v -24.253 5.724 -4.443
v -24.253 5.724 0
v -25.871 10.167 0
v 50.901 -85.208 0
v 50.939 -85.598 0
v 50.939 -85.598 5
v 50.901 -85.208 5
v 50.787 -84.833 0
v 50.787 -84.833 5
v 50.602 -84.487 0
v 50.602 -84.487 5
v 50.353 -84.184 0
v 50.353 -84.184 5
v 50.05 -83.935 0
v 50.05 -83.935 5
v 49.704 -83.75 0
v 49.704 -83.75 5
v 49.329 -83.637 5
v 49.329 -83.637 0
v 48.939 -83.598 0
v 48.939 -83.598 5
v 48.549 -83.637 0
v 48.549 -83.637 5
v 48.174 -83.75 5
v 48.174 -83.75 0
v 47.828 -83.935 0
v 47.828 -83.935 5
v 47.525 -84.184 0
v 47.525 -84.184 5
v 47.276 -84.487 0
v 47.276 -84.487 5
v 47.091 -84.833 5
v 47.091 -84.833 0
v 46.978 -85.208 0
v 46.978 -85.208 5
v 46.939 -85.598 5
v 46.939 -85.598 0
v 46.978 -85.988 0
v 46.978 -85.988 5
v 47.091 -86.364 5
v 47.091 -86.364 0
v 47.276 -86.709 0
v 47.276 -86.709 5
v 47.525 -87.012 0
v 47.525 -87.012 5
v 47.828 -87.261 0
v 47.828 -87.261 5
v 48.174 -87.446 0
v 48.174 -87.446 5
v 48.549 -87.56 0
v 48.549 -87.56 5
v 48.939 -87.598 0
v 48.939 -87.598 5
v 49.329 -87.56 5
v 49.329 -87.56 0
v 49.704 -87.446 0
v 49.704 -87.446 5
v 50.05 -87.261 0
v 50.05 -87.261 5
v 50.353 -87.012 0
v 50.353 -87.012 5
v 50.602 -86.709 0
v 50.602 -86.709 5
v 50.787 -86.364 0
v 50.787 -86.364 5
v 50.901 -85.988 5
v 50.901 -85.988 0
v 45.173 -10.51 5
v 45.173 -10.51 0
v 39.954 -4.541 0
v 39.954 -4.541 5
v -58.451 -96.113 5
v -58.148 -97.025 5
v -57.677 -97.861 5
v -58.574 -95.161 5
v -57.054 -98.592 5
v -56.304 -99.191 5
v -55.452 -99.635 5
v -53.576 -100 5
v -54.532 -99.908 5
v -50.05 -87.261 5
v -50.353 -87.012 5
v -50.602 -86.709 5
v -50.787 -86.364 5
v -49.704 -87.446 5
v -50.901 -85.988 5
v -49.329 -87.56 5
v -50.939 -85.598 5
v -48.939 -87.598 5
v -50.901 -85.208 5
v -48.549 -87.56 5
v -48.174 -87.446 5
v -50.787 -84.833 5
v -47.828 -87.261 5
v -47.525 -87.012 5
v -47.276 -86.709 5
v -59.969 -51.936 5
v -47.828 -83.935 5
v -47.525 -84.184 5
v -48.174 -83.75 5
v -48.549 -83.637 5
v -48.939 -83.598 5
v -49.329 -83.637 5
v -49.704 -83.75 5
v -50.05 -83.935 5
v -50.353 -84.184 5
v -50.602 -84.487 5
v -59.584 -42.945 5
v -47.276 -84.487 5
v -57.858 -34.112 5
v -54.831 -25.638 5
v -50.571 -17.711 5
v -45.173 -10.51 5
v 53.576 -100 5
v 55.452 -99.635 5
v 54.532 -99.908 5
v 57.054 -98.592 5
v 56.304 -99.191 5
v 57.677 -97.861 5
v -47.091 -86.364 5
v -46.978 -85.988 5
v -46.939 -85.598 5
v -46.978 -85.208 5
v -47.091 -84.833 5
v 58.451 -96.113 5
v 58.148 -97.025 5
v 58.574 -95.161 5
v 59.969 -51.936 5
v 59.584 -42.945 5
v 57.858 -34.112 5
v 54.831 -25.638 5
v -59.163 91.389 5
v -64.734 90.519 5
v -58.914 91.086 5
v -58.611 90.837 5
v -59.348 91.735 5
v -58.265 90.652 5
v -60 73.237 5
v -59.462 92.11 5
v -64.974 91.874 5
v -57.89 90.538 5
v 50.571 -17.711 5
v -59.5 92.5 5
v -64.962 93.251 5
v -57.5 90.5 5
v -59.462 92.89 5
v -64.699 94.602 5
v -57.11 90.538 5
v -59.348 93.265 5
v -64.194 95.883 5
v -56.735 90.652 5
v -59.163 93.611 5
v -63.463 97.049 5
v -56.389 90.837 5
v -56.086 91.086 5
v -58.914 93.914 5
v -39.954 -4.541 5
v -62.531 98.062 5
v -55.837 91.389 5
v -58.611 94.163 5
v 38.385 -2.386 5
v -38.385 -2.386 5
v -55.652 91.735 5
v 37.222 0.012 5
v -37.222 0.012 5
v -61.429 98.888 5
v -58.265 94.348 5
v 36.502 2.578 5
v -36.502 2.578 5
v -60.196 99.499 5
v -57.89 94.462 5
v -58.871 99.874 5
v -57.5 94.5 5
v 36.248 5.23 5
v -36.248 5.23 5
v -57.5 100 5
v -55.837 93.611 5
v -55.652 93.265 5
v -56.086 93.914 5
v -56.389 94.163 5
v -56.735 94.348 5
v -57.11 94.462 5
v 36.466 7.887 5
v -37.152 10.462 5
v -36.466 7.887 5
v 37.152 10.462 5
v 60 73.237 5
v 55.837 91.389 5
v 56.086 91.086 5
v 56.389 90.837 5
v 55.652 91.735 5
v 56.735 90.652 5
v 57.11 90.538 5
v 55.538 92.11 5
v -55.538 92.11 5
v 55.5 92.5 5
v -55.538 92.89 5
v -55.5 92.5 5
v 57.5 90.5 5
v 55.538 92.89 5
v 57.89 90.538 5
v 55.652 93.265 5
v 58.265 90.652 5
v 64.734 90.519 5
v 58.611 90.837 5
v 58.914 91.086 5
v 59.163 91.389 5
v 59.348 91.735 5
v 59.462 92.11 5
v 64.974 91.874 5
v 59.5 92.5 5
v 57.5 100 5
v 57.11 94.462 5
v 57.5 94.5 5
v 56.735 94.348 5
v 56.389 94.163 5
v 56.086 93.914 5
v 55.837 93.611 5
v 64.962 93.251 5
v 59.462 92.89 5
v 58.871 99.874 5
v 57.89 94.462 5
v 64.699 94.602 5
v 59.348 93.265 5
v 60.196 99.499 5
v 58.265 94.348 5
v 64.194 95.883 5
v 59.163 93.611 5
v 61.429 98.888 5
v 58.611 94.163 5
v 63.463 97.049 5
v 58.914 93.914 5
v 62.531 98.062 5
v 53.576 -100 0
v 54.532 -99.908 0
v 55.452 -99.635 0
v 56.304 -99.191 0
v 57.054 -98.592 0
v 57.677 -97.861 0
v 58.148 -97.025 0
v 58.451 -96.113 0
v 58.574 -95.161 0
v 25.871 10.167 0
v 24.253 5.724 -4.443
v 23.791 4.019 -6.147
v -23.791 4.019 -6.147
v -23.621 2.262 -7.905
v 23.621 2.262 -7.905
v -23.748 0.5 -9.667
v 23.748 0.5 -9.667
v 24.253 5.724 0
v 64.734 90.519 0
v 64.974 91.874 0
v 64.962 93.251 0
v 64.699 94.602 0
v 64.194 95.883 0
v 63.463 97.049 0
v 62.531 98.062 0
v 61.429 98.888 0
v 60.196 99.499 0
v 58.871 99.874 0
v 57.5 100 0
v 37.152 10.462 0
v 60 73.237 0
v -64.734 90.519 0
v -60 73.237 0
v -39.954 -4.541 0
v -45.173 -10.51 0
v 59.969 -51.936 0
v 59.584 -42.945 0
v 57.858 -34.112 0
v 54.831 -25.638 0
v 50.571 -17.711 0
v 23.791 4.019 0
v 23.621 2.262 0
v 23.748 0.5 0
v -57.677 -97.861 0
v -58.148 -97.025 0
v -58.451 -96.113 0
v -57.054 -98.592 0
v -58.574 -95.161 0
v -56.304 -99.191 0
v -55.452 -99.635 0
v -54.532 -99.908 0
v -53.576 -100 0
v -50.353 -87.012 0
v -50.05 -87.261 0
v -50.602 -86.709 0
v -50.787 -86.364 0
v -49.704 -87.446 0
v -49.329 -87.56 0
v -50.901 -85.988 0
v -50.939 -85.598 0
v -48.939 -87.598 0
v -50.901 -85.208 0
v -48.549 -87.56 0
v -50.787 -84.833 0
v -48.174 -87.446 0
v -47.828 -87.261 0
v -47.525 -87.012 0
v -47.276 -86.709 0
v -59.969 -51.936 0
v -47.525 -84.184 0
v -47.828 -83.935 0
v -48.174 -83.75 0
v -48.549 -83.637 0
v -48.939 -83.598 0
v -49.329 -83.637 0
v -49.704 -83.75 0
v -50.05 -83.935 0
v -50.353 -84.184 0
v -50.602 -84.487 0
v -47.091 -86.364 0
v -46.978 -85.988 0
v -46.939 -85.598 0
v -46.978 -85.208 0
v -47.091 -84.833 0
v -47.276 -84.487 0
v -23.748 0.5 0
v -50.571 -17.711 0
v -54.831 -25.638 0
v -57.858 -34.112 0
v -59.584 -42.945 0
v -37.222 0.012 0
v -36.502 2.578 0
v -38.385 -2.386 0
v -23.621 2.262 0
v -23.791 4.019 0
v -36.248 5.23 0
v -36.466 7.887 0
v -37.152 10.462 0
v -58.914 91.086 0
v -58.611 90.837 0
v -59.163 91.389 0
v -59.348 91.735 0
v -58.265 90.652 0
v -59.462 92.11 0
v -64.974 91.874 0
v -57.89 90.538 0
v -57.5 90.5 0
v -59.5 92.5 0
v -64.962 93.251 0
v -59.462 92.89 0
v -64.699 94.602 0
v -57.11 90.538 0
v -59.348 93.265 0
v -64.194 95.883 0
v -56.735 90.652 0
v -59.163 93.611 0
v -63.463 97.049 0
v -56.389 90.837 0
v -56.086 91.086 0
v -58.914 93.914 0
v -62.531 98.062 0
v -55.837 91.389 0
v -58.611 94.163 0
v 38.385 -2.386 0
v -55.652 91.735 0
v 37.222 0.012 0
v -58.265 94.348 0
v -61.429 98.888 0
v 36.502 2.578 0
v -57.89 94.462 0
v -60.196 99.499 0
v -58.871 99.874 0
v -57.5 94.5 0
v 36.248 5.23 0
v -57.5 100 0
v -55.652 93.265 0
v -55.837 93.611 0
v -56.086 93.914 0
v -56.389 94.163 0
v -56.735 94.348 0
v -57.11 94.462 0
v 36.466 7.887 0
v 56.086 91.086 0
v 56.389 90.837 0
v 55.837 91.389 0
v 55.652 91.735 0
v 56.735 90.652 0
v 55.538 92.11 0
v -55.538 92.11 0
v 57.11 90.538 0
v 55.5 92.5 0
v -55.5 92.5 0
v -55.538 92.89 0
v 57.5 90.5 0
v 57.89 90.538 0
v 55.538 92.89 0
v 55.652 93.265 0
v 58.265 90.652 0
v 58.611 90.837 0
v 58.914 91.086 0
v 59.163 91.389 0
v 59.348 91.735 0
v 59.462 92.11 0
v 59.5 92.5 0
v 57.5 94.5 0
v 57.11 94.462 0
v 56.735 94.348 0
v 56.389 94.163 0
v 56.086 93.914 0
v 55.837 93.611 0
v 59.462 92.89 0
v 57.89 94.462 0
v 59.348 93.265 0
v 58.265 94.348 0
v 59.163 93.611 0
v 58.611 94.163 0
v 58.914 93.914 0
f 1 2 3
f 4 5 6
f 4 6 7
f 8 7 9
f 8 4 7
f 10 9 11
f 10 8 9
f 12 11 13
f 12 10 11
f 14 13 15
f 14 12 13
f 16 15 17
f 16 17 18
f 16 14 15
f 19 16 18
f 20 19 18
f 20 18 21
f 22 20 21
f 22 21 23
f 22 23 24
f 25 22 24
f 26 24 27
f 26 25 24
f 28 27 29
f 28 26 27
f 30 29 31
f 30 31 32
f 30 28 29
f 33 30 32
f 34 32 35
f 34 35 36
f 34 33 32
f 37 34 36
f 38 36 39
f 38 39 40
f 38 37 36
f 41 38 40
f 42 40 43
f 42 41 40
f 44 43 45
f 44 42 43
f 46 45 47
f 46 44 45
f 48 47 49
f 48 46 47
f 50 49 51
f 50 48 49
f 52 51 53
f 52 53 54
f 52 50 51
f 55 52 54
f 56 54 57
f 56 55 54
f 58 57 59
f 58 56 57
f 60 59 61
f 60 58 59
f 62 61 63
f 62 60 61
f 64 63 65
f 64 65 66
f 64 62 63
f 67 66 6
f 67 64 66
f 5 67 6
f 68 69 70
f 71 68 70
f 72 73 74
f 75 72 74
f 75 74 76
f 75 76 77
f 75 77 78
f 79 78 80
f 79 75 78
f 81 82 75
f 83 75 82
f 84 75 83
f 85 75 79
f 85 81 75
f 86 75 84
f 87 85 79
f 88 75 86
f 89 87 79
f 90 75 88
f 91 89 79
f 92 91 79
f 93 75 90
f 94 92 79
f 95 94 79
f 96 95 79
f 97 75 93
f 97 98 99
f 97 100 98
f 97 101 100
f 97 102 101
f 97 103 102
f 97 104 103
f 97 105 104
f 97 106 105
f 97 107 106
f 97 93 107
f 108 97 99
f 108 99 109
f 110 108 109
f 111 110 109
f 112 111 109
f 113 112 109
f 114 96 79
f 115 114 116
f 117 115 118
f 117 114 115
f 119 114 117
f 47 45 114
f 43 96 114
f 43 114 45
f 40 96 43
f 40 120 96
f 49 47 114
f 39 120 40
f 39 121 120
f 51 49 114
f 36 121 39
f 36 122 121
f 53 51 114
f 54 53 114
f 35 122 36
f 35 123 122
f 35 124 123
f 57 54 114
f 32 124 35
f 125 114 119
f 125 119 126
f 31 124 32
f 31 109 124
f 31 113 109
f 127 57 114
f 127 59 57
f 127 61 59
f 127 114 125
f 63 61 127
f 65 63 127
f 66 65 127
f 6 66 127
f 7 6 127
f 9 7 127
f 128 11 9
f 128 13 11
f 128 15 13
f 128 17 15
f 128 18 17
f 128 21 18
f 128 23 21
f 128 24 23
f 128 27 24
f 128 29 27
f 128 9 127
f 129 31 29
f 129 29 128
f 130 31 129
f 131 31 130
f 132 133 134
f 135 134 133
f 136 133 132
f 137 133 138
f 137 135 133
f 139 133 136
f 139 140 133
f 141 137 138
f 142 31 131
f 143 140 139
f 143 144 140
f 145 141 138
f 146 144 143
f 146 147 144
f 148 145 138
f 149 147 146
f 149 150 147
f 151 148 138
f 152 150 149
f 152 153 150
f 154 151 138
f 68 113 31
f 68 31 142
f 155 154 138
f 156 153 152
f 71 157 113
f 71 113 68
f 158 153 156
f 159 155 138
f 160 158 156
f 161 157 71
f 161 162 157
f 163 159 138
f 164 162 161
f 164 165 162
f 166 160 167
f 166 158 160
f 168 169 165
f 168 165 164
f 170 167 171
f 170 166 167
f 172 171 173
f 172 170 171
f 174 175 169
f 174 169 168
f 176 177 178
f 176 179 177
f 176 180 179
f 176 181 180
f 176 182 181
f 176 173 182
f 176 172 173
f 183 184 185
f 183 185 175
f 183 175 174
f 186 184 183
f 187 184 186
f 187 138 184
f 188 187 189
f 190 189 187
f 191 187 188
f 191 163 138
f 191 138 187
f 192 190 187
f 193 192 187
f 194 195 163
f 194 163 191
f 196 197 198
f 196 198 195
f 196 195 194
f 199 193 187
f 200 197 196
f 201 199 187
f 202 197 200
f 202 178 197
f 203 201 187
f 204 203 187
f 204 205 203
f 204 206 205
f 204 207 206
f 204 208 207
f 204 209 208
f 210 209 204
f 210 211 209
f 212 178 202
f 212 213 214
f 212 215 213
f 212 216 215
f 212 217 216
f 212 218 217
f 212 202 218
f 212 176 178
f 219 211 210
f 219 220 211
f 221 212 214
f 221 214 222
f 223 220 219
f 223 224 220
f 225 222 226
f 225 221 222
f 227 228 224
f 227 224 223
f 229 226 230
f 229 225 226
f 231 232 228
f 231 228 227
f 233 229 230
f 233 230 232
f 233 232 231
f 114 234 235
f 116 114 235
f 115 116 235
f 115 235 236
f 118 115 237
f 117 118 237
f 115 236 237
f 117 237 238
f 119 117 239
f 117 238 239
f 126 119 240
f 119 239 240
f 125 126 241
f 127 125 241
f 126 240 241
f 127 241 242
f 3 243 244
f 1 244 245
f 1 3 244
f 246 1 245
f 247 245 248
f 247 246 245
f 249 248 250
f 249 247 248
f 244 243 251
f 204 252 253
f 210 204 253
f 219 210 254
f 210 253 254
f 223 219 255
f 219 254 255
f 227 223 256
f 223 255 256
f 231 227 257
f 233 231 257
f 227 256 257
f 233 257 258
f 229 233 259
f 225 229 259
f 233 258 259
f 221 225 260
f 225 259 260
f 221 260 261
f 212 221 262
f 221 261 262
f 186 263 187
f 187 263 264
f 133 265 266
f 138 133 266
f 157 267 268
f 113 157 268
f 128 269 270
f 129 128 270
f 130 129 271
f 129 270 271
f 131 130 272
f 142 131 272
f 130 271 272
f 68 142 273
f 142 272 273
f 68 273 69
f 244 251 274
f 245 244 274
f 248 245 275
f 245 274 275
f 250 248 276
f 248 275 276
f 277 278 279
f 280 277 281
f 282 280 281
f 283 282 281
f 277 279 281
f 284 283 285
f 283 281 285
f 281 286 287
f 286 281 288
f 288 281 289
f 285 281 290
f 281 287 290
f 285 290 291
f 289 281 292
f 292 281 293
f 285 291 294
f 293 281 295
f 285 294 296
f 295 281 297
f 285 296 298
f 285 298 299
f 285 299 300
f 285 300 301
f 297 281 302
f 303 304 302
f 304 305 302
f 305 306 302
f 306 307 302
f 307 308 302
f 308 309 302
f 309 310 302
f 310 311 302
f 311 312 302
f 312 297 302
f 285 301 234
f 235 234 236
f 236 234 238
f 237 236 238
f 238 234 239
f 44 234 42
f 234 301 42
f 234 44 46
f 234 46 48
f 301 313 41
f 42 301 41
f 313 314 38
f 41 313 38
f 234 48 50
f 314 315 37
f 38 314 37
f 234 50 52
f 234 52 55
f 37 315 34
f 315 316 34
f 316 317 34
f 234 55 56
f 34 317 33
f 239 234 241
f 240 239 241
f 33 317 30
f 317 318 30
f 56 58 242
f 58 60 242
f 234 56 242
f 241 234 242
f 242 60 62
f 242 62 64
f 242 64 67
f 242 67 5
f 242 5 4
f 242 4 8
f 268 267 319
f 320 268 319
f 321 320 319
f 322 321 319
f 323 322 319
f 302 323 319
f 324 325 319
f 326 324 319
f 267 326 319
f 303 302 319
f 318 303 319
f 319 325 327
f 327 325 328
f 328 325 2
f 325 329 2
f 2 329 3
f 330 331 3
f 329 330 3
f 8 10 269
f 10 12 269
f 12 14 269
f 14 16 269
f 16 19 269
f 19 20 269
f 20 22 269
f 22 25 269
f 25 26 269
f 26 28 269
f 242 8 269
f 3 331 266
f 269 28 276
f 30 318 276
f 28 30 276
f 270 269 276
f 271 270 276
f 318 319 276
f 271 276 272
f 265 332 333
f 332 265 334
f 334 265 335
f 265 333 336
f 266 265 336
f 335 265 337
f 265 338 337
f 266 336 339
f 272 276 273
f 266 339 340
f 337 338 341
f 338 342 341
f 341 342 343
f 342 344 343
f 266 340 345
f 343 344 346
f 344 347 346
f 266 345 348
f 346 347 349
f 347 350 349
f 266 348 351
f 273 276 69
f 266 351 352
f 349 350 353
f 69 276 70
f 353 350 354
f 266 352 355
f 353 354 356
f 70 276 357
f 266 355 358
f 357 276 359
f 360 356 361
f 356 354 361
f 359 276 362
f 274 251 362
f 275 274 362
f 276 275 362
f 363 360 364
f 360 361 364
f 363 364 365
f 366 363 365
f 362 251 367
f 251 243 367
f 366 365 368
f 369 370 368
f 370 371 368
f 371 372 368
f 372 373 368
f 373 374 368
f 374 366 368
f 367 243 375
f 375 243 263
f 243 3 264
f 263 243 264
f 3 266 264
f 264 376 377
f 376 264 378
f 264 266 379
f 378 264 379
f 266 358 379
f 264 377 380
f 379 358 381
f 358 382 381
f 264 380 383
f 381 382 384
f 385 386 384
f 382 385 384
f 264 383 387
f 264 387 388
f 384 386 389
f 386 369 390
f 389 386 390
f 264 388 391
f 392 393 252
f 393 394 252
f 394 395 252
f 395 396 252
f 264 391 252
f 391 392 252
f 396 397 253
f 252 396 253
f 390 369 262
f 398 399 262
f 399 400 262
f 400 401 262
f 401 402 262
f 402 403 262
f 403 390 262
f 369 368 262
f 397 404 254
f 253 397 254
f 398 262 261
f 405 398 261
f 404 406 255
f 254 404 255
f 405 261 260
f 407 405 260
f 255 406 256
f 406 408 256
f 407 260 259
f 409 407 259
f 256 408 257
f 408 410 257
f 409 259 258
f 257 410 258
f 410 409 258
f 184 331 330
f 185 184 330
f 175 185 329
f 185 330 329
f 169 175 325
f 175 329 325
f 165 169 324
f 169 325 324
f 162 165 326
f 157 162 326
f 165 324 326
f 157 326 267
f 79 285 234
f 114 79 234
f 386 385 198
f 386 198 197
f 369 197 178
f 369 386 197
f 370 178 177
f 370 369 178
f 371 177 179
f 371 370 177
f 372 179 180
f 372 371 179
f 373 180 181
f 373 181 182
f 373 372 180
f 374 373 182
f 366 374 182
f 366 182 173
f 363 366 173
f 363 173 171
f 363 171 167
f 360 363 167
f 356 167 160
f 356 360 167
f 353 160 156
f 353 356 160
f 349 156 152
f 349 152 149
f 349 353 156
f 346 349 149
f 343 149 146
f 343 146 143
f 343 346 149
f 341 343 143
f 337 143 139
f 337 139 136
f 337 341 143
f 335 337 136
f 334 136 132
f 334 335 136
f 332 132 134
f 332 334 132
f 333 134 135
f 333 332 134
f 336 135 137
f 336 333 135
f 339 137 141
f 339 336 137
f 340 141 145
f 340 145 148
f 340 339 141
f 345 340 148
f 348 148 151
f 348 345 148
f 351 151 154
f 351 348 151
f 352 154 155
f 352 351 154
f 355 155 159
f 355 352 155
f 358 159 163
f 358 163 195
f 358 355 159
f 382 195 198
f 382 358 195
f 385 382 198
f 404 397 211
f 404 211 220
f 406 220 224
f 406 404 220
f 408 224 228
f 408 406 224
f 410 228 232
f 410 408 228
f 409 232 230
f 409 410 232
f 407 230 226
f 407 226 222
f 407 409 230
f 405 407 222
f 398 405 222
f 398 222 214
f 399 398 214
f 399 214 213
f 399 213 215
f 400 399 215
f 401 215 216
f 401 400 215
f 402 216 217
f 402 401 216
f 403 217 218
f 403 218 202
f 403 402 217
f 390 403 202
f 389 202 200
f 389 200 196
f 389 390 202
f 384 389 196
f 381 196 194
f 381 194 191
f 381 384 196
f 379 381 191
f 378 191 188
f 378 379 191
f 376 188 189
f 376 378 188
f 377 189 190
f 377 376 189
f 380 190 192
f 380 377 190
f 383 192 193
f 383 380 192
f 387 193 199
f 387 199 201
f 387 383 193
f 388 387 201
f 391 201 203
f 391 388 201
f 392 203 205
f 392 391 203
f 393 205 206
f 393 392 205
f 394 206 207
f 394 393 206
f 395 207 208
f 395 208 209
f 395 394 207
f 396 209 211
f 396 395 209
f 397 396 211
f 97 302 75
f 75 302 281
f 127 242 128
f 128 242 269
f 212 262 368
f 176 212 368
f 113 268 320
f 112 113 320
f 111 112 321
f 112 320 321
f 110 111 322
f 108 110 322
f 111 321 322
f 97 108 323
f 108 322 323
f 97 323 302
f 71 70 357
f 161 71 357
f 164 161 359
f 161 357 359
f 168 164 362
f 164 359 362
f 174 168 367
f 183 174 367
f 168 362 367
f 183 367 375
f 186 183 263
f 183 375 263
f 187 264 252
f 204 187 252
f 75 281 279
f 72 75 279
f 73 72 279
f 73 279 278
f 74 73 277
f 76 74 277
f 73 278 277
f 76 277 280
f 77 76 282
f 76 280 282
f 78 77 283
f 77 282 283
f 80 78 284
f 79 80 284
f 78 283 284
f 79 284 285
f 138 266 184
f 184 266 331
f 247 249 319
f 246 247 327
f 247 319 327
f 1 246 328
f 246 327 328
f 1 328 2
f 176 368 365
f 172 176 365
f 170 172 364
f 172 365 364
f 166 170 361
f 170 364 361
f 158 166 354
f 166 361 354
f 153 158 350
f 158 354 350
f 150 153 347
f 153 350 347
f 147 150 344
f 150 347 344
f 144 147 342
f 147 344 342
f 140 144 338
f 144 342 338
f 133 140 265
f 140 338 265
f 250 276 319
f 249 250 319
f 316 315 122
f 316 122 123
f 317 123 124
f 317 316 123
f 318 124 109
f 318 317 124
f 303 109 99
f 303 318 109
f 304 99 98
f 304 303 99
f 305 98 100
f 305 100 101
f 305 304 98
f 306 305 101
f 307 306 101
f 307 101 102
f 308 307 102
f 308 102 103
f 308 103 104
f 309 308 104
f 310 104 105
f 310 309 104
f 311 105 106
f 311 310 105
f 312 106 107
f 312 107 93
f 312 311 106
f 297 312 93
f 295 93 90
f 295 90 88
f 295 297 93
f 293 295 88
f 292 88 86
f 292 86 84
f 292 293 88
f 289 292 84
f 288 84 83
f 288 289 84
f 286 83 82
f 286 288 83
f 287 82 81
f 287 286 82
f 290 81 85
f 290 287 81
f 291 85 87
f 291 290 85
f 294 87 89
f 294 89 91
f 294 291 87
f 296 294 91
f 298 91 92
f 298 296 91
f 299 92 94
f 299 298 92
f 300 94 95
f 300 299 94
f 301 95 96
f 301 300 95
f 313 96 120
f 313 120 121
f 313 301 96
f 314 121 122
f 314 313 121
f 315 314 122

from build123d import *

# Parameters (mm, degrees)
SKETCH1_R           = 2
BOSS_EXTRUDE1_DEPTH = 5
BOSS_EXTRUDE2_DEPTH = 10
CHAMFER2_SIZE       = 10


with BuildPart() as part:
    # Sketch1 → Boss-Extrude1 (new body)
    with BuildSketch(Plane.XY):
        with BuildLine():
            Line((-39.95406266, -4.540740277), (-45.172708428, -10.510426525))
            ThreePointArc((-45.172708428, -10.510426525), (-56.503917554, -29.818144261), (-59.968772691, -51.935536587))
            Line((-59.968772691, -51.935536587), (-58.57362931, -95.161294716))
            ThreePointArc((-58.57362931, -95.161294716), (-57.054271725, -98.592107569), (-53.576231585, -100))
            Line((-53.576231585, -100), (-50, -100))
            Line((-50, -100), (50, -100))
            Line((50, -100), (53.576231585, -100))
            ThreePointArc((53.576231585, -100), (57.054271725, -98.592107569), (58.57362931, -95.161294716))
            Line((58.57362931, -95.161294716), (59.968772691, -51.935536587))
            ThreePointArc((59.968772691, -51.935536587), (56.503917554, -29.818144261), (45.172708428, -10.510426525))
            Line((45.172708428, -10.510426525), (39.95406266, -4.540740277))
            ThreePointArc((39.95406266, -4.540740277), (36.502239109, 2.577573283), (37.151850455, 10.461955241))
            Line((37.151850455, 10.461955241), (60, 73.236730193))
            Line((60, 73.236730193), (64.733567494, 90.51871221))
            ThreePointArc((64.733567494, 90.51871221), (63.462787034, 97.049194521), (57.5, 100))
            Line((57.5, 100), (55, 100))
            Line((55, 100), (-55, 100))
            Line((-55, 100), (-57.5, 100))
            ThreePointArc((-57.5, 100), (-63.462787034, 97.049194521), (-64.733567494, 90.51871221))
            Line((-64.733567494, 90.51871221), (-60, 73.236730193))
            Line((-60, 73.236730193), (-37.151850455, 10.461955241))
            ThreePointArc((-37.151850455, 10.461955241), (-36.502239109, 2.577573283), (-39.95406266, -4.540740277))
        make_face()
        with Locations((-57.5, 92.5)):
            Circle(SKETCH1_R, mode=Mode.SUBTRACT)
        with Locations((57.5, 92.5)):
            Circle(SKETCH1_R, mode=Mode.SUBTRACT)
        with Locations((48.939097244, -85.598196118)):
            Circle(SKETCH1_R, mode=Mode.SUBTRACT)
        with Locations((-48.939097244, -85.598196118)):
            Circle(SKETCH1_R, mode=Mode.SUBTRACT)
    extrude(amount=BOSS_EXTRUDE1_DEPTH)

    # Sketch2 → Boss-Extrude2 (add)
    with BuildSketch(Plane(origin=(0, 0, 0), x_dir=(-1, 0, 0), z_dir=(0, 0, -1))):
        with BuildLine():
            Line((-23.747944524, 0.5), (23.747944524, 0.5))
            ThreePointArc((23.747944524, 0.5), (23.669056818, 3.144030102), (24.253462846, 5.723872742))
            Line((24.253462846, 5.723872742), (25.870507592, 10.166666667))
            Line((25.870507592, 10.166666667), (-25.870507592, 10.166666667))
            Line((-25.870507592, 10.166666667), (-24.253462846, 5.723872742))
            ThreePointArc((-24.253462846, 5.723872742), (-23.669056818, 3.144030102), (-23.747944524, 0.5))
        make_face()
    extrude(amount=BOSS_EXTRUDE2_DEPTH)

    # Chamfer2
    # the kernel refuses this chamfer: 10 mm, written as the material it takes off along each edge
    with BuildSketch(Plane(origin=(-51.587337472, 10.166666667, -10), x_dir=(0, 0.027495876610586317, 0.9996219169112968), z_dir=(1, 0, 0))) as chamfer2_piece_1_section:
        Polygon((CHAMFER2_SIZE * 0.999621916911, CHAMFER2_SIZE * 0.0274958766106), (-CHAMFER2_SIZE * 0.0274958766106, CHAMFER2_SIZE * 0.999621916911), (0, 0), align=None)
    chamfer2_piece_1 = extrude(amount=103.174674944, mode=Mode.PRIVATE)
    chamfer2_piece_1 = split(chamfer2_piece_1, bisect_by=Plane(origin=(0, 6.862625123, 0), z_dir=(0, 0, -1)), keep=Keep.TOP, mode=Mode.PRIVATE)
    add(chamfer2_piece_1, mode=Mode.SUBTRACT)


solid = part.part
